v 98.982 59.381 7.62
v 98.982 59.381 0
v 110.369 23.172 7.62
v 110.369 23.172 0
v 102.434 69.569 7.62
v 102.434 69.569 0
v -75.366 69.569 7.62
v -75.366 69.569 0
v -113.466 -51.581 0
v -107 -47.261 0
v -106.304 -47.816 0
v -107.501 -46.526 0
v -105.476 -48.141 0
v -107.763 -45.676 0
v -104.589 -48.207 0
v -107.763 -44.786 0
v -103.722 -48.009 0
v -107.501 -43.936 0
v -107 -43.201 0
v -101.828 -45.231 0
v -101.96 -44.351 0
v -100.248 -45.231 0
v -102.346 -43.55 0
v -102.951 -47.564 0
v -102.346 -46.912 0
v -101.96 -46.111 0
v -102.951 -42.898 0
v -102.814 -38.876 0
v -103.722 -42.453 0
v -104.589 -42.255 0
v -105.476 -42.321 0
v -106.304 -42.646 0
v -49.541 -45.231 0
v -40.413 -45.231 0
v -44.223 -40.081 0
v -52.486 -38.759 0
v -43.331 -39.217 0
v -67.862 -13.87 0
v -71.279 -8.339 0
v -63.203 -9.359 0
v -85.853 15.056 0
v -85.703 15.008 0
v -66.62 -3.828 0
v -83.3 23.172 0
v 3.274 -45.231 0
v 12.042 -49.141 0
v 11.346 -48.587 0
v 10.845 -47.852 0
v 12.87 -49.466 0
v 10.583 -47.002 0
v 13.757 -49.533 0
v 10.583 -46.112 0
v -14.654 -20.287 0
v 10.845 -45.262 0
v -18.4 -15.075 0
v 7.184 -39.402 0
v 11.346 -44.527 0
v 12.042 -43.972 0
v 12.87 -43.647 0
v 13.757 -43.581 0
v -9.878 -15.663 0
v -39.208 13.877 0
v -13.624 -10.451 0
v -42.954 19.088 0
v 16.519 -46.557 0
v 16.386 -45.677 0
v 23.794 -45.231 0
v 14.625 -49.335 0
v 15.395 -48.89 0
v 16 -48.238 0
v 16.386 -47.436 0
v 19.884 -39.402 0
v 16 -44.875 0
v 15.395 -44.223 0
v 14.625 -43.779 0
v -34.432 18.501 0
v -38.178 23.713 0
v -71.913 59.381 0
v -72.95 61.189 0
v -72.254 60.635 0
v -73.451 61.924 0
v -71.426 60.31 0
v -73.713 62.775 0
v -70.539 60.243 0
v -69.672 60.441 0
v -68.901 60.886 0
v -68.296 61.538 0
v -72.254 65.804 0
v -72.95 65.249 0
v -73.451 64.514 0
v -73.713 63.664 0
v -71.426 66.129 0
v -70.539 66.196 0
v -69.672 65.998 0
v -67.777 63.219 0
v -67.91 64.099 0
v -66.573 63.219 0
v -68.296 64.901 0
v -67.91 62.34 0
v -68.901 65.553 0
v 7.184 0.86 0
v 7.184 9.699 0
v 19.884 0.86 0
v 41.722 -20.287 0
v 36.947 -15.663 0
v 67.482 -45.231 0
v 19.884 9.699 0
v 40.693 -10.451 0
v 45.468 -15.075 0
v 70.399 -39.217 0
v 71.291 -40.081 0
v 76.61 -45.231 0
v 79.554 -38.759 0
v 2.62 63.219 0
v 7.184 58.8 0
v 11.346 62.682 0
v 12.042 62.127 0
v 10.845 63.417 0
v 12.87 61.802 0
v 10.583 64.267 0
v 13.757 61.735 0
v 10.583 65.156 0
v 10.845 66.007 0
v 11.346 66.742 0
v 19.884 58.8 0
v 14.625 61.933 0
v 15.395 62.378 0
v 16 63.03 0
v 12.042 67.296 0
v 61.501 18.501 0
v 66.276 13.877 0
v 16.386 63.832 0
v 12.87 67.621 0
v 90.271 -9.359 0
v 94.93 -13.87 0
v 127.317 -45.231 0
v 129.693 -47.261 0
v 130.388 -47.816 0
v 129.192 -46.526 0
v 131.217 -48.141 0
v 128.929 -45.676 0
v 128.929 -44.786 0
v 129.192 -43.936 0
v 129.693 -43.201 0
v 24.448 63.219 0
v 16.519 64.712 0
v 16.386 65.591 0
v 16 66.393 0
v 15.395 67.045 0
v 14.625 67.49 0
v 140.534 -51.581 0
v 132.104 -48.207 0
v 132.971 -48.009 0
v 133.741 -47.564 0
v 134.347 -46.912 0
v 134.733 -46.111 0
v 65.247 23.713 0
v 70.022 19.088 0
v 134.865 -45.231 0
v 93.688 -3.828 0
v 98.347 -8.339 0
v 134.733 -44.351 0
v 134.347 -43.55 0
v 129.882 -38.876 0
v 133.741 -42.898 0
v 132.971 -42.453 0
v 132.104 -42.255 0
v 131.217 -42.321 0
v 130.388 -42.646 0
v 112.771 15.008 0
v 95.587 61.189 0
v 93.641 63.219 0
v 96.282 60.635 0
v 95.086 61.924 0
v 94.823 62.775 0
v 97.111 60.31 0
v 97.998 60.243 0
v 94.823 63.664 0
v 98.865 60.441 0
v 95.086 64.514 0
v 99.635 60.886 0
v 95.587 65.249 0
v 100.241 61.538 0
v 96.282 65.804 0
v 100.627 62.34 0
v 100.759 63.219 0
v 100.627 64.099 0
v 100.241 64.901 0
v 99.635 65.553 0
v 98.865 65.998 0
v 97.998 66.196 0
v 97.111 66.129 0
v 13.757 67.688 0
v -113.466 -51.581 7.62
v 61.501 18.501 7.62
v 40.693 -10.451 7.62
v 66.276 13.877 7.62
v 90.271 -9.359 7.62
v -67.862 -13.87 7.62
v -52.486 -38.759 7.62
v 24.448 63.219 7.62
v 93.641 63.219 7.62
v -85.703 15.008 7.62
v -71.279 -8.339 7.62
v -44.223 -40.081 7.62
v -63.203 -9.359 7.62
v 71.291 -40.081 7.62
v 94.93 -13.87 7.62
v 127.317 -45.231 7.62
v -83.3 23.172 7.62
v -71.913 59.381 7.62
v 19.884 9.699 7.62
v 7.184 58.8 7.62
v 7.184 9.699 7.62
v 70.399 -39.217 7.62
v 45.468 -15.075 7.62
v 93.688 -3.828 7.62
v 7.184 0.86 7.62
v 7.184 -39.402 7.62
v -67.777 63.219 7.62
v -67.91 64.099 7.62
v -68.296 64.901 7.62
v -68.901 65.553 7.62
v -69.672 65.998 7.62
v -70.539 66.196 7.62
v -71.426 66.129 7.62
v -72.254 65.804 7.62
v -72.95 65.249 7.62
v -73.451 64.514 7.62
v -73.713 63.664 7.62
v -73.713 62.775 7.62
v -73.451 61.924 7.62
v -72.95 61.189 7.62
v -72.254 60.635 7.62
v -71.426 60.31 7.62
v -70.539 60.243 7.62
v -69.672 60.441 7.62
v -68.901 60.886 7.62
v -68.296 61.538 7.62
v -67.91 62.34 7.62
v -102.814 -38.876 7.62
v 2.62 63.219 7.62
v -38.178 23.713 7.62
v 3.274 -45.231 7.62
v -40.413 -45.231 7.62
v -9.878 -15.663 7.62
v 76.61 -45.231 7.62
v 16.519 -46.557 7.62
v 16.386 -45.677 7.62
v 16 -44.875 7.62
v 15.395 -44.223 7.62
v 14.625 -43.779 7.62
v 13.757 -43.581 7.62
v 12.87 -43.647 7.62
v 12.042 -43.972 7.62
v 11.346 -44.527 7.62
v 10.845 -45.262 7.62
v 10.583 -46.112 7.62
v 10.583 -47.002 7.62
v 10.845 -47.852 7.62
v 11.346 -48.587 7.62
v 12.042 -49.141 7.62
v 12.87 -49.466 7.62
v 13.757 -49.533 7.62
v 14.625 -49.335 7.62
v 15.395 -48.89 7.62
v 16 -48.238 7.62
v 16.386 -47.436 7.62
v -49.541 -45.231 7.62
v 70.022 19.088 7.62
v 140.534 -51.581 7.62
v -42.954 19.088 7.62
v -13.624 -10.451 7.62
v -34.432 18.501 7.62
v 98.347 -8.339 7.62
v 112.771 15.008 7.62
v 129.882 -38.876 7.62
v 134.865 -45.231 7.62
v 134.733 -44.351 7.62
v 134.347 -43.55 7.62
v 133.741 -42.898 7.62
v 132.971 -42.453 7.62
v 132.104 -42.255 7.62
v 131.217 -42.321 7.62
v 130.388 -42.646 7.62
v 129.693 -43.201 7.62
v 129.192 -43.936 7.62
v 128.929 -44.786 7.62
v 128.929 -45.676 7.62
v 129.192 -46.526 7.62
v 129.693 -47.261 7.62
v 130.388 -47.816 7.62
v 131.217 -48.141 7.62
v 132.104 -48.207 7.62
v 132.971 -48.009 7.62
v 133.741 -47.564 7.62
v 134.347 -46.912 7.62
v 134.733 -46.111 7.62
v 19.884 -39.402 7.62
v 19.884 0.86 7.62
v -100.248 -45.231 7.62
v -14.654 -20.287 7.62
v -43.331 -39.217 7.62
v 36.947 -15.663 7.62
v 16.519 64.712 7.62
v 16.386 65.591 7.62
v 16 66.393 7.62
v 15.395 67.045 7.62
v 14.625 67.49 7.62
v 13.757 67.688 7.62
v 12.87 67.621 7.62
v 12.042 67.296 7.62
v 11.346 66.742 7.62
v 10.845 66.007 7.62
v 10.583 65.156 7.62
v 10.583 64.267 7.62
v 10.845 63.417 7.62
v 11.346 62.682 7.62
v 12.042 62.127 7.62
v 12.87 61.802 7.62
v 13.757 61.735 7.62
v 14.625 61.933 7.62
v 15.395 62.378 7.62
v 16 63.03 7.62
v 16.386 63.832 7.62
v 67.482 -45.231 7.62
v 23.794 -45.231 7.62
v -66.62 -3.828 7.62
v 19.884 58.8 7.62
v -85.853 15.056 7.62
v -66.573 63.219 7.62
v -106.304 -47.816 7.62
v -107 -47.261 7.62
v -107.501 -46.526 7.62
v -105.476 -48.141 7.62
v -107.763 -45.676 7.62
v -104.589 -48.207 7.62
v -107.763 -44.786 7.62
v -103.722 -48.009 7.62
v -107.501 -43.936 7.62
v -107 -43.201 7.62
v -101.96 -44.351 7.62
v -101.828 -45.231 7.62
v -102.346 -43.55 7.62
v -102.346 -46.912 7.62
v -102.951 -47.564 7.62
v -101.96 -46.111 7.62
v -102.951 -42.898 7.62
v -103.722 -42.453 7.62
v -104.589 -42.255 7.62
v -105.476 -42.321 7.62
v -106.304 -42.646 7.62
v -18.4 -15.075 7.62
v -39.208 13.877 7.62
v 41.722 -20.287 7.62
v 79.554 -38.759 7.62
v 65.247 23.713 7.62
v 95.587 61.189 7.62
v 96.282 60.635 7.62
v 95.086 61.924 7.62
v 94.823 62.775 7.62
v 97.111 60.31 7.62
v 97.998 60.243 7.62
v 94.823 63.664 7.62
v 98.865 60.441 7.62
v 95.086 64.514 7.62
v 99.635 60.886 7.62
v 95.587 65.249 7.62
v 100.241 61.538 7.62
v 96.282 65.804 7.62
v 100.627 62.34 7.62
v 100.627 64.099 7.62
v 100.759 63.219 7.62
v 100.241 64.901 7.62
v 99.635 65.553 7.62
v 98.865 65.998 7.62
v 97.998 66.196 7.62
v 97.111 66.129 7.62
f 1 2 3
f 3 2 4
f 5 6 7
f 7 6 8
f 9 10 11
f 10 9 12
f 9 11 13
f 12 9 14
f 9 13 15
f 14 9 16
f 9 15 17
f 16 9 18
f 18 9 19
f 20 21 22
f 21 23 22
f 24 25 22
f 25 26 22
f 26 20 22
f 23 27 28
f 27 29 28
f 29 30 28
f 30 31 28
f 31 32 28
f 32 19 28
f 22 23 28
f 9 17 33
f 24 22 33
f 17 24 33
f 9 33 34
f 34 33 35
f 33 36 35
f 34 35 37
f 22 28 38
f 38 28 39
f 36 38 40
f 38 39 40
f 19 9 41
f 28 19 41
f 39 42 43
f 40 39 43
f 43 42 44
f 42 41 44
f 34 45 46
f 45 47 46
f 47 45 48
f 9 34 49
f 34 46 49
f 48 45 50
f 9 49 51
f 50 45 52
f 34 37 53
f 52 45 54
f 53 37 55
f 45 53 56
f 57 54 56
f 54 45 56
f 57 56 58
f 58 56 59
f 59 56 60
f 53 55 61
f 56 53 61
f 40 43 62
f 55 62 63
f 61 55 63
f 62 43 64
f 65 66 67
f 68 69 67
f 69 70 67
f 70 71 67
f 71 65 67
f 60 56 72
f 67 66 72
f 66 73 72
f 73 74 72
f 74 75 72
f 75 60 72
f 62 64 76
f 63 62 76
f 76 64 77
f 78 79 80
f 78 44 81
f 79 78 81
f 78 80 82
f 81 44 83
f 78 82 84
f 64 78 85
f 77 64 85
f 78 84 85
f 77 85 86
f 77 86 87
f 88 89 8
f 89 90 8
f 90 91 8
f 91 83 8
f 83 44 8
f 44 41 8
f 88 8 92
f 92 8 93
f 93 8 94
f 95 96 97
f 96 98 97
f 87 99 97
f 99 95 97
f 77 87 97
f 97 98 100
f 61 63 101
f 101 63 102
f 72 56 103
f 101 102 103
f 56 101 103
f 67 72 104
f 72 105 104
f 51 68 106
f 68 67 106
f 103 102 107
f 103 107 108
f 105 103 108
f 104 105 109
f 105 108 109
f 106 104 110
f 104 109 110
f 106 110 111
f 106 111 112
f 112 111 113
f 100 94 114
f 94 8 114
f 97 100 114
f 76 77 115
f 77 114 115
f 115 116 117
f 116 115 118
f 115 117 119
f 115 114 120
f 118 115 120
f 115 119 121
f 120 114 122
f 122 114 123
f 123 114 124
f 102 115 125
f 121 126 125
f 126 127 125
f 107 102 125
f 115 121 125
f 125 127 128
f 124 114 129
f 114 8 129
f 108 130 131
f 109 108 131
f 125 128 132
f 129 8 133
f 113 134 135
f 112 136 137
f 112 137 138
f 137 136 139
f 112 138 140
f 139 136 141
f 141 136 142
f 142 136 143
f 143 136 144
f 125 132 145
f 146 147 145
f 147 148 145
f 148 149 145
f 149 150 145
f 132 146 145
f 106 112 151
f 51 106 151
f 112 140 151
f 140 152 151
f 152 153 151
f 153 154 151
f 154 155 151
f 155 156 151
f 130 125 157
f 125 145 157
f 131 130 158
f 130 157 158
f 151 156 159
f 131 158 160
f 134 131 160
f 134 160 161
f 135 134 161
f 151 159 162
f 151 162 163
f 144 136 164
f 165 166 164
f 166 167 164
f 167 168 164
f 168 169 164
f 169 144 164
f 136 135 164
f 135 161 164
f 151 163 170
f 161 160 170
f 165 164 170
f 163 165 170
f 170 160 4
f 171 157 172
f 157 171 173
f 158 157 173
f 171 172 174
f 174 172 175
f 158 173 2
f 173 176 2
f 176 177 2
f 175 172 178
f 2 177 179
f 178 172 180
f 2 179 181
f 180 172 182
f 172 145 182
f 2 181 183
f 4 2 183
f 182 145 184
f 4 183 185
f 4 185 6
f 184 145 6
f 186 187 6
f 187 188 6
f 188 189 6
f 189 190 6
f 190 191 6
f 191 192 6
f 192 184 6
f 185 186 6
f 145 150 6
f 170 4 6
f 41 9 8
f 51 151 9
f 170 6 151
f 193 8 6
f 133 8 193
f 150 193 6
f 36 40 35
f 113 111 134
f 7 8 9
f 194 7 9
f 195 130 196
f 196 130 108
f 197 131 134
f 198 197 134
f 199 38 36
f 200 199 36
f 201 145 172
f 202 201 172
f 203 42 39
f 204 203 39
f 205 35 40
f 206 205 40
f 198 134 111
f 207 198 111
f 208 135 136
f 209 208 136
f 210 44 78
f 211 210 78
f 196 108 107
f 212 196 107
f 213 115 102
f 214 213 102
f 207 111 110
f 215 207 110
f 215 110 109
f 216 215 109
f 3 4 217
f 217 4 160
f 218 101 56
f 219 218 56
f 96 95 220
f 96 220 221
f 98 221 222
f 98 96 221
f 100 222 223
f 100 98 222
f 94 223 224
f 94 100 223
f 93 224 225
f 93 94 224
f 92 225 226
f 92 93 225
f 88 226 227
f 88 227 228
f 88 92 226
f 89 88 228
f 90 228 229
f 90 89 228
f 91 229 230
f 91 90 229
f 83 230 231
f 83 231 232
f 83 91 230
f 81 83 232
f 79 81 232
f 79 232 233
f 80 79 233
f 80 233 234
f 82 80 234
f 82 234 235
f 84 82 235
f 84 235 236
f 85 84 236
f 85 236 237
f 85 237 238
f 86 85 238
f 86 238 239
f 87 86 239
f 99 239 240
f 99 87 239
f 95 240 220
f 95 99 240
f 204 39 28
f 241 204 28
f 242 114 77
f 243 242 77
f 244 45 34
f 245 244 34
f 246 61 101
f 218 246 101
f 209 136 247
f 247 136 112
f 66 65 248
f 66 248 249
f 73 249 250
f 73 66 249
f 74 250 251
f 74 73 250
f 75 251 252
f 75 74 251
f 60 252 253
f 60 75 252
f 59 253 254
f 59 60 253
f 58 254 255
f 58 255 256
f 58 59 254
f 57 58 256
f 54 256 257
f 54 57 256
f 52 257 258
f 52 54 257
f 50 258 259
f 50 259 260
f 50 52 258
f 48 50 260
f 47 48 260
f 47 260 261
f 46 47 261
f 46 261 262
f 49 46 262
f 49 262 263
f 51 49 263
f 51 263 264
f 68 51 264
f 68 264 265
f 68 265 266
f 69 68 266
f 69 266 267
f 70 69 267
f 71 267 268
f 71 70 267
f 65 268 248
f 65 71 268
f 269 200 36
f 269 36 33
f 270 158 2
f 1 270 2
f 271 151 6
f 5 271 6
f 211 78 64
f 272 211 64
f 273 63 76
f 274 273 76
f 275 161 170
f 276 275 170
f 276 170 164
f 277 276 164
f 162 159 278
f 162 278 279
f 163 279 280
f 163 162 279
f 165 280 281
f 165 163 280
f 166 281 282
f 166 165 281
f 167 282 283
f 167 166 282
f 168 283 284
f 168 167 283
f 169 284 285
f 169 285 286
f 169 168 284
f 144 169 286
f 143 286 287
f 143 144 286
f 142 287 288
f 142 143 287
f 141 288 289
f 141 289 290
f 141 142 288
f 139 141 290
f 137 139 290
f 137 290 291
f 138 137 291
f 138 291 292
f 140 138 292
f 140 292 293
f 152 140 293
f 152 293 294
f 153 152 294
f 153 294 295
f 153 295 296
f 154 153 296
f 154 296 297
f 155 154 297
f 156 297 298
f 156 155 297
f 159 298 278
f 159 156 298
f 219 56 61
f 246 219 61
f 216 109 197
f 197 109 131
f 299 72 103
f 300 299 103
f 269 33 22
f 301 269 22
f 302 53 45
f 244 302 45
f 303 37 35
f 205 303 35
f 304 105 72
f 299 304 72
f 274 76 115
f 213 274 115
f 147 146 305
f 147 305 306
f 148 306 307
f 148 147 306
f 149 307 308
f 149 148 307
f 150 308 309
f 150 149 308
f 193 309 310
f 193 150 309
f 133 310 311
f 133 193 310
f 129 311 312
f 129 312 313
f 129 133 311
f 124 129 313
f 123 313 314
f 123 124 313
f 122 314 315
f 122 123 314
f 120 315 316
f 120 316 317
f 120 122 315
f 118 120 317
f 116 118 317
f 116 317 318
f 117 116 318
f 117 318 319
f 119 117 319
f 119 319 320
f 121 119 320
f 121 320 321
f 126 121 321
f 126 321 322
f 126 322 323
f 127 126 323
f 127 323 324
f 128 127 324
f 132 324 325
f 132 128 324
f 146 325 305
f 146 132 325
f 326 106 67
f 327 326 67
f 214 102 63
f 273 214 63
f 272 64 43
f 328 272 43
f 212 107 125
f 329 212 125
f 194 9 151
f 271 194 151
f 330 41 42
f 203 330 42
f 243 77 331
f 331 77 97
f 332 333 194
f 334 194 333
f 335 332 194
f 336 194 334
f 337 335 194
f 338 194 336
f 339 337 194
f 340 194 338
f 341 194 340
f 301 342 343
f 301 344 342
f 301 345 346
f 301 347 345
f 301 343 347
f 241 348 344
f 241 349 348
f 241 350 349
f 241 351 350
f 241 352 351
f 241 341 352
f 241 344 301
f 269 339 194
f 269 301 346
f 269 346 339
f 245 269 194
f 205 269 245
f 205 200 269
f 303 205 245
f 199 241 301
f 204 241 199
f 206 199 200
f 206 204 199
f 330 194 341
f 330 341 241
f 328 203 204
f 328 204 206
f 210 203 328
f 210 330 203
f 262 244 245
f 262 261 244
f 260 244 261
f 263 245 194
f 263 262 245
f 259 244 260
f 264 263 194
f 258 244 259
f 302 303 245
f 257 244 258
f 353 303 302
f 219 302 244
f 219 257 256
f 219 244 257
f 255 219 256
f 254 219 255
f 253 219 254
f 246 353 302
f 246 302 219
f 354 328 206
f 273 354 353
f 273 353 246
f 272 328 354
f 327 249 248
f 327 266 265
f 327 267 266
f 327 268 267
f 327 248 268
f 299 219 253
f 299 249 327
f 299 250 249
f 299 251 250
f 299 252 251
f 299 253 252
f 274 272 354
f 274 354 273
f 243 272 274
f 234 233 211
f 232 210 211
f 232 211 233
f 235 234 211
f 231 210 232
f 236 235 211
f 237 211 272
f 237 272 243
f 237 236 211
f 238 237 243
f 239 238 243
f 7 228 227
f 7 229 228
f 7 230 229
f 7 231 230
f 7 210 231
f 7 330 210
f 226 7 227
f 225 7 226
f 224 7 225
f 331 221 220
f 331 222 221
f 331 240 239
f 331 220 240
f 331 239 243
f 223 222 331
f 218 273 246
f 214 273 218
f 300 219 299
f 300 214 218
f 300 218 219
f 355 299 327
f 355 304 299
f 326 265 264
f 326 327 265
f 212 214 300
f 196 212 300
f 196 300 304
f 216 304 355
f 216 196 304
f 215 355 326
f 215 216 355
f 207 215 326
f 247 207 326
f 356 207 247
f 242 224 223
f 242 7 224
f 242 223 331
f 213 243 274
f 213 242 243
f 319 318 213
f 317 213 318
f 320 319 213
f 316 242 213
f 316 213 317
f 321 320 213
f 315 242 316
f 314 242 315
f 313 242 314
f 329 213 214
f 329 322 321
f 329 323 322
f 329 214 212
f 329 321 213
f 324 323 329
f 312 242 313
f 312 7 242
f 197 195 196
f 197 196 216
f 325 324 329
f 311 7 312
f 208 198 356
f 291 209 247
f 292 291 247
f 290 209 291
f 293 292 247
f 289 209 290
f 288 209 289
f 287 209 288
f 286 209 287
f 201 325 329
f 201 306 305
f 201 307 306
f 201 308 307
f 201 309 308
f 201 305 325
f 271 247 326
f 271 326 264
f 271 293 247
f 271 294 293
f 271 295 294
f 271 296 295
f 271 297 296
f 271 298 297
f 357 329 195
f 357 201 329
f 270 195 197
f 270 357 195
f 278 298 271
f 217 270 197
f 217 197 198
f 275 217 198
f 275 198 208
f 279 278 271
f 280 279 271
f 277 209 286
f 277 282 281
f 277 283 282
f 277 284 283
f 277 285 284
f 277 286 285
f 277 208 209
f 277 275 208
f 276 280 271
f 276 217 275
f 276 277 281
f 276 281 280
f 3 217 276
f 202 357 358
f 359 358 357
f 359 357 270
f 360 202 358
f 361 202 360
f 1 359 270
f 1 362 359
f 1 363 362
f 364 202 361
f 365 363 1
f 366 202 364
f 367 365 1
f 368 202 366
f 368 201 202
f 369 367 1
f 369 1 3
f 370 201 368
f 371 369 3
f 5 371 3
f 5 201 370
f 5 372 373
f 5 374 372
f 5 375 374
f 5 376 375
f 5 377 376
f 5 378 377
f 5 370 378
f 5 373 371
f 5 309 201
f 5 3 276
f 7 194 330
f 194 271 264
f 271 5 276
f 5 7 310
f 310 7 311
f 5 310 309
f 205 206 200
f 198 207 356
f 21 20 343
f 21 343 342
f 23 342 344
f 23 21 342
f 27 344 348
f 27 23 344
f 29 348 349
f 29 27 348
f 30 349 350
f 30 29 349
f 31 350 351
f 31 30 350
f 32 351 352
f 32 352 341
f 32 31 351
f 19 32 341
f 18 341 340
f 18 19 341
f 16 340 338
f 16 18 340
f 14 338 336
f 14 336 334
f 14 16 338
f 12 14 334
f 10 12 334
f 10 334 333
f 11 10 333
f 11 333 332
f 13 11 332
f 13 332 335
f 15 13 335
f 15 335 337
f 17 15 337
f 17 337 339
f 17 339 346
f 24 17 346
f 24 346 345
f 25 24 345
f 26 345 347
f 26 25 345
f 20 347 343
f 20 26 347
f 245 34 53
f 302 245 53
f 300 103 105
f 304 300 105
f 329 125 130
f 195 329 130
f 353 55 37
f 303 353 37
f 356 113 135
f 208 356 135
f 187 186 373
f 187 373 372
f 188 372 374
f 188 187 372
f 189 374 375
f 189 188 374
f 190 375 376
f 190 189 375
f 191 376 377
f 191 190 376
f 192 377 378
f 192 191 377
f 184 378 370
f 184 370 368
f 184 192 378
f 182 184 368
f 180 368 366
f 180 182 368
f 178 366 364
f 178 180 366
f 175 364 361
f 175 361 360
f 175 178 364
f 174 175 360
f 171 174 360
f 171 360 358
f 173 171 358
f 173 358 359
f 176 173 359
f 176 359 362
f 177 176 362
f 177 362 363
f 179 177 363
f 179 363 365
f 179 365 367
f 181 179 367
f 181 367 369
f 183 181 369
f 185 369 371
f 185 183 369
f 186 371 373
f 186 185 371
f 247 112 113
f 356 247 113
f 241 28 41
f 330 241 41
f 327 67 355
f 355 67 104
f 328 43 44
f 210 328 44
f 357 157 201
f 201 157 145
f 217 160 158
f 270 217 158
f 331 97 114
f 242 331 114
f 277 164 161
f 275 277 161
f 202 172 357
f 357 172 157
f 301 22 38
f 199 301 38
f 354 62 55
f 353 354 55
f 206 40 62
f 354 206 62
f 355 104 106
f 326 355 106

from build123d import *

# Parameters (mm, degrees)
F0_R     = 2.9845
F1_DEPTH = 7.62


with BuildPart() as f1:
    # F0 (on Top) → F1 (new body)
    with BuildSketch(Plane.XY):
        Polygon((-75.365749, 69.569385), (-113.465749, -51.580893), (13.534251, -51.580893), (140.534251, -51.580893), (102.434251, 69.569385), (13.534251, 69.569385), align=None)
        with Locations((-104.812158, -45.230893)):
            Circle(F0_R, mode=Mode.SUBTRACT)
        Polygon((-49.541476, -45.230893), (-100.24803, -45.230893), (-67.861694, -13.870002), (-52.485536, -38.758501), align=None, mode=Mode.SUBTRACT)
        Polygon((3.274268, -45.230893), (-40.41322, -45.230893), (-14.65364, -20.286936), align=None, mode=Mode.SUBTRACT)
        Polygon((-102.813653, -38.876052), (-85.852937, 15.055587), (-85.702804, 15.008373), (-71.278508, -8.339402), align=None, mode=Mode.SUBTRACT)
        Polygon((-63.202862, -9.358682), (-39.207877, 13.876552), (-18.399576, -15.075035), (-43.330528, -39.216602), (-44.222796, -40.080618), align=None, mode=Mode.SUBTRACT)
        Polygon((7.184251, 0.859504), (7.184251, -39.402304), (-9.878115, -15.662617), align=None, mode=Mode.SUBTRACT)
        with Locations((13.534251, -46.55671)):
            Circle(F0_R, mode=Mode.SUBTRACT)
        Polygon((23.794234, -45.230893), (41.722141, -20.286936), (67.481722, -45.230893), align=None, mode=Mode.SUBTRACT)
        with Locations((131.88066, -45.230893)):
            Circle(F0_R, mode=Mode.SUBTRACT)
        Polygon((127.316531, -45.230893), (76.609978, -45.230893), (79.554038, -38.758501), (94.930195, -13.870002), align=None, mode=Mode.SUBTRACT)
        Polygon((19.884251, -39.402304), (19.884251, 0.859504), (36.946616, -15.662617), align=None, mode=Mode.SUBTRACT)
        Polygon((45.468077, -15.075035), (66.276379, 13.876552), (90.271363, -9.358682), (71.291298, -40.080618), (70.39903, -39.216602), align=None, mode=Mode.SUBTRACT)
        Polygon((98.34701, -8.339402), (112.771306, 15.008373), (129.882154, -38.876052), align=None, mode=Mode.SUBTRACT)
        Polygon((-83.30042, 23.172075), (-71.91322, 59.381063), (-42.953813, 19.088452), (-66.619676, -3.828081), align=None, mode=Mode.SUBTRACT)
        Polygon((-34.432352, 18.50087), (7.184251, 58.799771), (7.184251, 9.698733), (-13.624051, -10.450717), align=None, mode=Mode.SUBTRACT)
        with Locations((-70.761945, 63.219385)):
            Circle(F0_R, mode=Mode.SUBTRACT)
        Polygon((-66.572778, 63.219385), (2.620123, 63.219385), (-38.178288, 23.71277), align=None, mode=Mode.SUBTRACT)
        Polygon((19.884251, 9.698733), (19.884251, 58.799771), (61.500854, 18.50087), (40.692552, -10.450717), align=None, mode=Mode.SUBTRACT)
        Polygon((70.022315, 19.088452), (98.981721, 59.381063), (110.368921, 23.172075), (93.688178, -3.828081), align=None, mode=Mode.SUBTRACT)
        Polygon((65.246789, 23.71277), (24.448379, 63.219385), (93.641279, 63.219385), align=None, mode=Mode.SUBTRACT)
        with Locations((13.534251, 64.711635)):
            Circle(F0_R, mode=Mode.SUBTRACT)
        with Locations((97.774625, 63.219385)):
            Circle(F0_R, mode=Mode.SUBTRACT)
    extrude(amount=F1_DEPTH)


solid = f1.part
